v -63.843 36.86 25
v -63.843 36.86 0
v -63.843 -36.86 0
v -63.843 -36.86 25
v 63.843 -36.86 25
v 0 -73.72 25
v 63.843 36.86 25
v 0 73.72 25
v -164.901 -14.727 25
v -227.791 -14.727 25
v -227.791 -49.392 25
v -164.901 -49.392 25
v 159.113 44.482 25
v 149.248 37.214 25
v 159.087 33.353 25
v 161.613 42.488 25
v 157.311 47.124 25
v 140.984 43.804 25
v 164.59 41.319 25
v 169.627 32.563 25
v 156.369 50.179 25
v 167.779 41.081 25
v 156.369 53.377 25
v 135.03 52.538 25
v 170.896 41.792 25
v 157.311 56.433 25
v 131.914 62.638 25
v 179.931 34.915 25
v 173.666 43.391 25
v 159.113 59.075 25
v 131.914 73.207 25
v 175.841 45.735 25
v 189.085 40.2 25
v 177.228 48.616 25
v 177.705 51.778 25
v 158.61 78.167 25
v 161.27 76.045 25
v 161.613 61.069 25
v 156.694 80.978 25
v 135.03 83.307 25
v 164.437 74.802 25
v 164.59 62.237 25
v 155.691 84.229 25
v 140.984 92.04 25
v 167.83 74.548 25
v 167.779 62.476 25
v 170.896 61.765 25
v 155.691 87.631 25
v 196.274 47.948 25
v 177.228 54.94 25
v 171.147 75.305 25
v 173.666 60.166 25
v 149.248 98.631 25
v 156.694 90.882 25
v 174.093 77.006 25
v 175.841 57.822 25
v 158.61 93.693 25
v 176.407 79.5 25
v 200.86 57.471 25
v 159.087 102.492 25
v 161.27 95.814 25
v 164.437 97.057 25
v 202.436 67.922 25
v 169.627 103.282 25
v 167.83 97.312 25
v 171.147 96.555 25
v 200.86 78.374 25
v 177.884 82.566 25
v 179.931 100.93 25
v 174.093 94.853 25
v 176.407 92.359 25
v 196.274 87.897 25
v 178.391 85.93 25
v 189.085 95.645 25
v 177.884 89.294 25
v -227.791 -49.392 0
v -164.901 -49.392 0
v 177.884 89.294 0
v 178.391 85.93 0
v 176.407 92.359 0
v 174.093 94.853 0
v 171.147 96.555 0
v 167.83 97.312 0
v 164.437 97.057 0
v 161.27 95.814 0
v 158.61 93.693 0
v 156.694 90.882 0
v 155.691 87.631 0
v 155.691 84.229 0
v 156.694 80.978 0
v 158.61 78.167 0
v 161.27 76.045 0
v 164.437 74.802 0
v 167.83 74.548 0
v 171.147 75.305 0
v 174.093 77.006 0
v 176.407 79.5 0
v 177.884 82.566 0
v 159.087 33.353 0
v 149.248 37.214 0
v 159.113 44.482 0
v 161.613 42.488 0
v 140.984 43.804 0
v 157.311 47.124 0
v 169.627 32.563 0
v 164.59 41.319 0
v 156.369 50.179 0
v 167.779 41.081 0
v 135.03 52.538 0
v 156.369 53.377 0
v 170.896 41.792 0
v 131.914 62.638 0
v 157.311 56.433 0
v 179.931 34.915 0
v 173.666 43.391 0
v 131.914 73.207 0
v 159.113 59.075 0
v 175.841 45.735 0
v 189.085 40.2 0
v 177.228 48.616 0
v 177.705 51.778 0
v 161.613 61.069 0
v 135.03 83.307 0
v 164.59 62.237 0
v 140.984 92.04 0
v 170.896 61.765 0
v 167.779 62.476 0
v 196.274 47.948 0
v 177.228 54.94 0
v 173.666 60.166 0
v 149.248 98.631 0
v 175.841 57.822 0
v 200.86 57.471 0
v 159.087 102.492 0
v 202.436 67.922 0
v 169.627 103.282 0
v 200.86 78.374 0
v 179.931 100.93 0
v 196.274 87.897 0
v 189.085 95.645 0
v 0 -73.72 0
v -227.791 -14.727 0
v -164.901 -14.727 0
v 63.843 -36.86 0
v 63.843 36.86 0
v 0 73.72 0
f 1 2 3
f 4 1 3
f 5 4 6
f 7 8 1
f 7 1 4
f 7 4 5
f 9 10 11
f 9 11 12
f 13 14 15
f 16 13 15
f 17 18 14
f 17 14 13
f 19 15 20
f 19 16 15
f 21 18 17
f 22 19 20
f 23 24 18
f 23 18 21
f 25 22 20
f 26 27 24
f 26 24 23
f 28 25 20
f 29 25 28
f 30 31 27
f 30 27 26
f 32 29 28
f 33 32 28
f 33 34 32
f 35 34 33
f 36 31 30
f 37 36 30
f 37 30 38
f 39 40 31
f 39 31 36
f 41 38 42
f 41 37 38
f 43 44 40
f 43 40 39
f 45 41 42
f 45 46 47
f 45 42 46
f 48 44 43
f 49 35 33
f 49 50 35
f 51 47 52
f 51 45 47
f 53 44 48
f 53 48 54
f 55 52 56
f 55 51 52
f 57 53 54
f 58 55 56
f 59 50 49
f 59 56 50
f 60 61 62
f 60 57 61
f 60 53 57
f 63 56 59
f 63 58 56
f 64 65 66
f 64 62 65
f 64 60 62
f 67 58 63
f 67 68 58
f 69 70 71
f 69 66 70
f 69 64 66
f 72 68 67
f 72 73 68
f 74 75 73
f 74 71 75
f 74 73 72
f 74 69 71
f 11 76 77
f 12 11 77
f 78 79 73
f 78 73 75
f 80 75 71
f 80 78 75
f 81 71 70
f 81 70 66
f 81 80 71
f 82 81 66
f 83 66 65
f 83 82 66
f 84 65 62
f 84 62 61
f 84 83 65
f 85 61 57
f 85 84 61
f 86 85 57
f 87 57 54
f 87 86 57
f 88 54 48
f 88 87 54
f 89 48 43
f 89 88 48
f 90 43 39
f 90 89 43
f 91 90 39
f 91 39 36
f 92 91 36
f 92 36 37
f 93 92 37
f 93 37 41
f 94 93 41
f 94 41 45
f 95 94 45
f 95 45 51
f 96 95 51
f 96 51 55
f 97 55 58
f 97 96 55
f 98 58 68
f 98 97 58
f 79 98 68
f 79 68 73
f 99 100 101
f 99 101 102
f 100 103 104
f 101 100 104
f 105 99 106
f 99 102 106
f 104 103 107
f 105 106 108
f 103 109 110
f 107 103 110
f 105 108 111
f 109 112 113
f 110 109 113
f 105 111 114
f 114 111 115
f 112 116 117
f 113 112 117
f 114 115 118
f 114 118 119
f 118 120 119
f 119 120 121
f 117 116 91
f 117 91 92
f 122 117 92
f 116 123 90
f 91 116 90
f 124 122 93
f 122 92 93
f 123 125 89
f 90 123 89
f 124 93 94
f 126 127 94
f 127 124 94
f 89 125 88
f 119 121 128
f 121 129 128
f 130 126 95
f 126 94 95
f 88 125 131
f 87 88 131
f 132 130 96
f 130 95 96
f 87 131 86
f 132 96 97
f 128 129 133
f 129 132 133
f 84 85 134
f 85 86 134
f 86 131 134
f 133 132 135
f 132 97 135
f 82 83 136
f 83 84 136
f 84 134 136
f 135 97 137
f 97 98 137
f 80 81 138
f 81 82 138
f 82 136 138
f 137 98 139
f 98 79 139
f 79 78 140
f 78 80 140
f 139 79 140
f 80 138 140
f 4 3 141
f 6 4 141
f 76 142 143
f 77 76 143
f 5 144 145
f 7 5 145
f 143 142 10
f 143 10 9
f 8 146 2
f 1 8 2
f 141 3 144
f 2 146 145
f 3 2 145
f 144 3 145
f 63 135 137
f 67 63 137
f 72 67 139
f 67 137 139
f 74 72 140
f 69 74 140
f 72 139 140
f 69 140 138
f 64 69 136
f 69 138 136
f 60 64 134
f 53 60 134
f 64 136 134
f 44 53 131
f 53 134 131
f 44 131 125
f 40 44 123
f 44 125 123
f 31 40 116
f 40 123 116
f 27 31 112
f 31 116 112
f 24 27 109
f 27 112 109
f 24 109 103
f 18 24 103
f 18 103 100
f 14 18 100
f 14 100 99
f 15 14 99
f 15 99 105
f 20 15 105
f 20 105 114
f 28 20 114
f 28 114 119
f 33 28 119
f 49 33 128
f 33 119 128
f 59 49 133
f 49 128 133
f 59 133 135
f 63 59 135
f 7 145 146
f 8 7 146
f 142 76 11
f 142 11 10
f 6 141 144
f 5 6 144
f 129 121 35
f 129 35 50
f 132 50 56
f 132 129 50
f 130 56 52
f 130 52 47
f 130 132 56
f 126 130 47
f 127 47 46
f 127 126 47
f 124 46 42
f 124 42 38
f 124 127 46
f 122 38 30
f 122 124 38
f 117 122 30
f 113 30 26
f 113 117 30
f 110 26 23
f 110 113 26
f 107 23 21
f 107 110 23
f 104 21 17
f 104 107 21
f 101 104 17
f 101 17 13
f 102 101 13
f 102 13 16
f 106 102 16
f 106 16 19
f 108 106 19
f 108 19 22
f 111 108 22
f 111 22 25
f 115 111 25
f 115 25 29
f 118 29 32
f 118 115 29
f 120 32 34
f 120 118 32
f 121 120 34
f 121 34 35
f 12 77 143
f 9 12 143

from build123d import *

# Parameters (mm, degrees)
F1_DEPTH = 25
F2_R     = 35.458634
F2_R_2   = 10.727885
F2_R_3   = 11.413684
F3_DEPTH = 25
F4_W     = 62.889963
F4_H     = 34.664976
F5_DEPTH = 25


with BuildPart() as f1:
    # F0 (on Top) → F1 (new body)
    with BuildSketch(Plane.XY):
        Polygon((63.843265, -36.859926), (63.843265, 36.859926), (0, 73.719853), (-63.843265, 36.859926), (-63.843265, -36.859926), (0, -73.719853), align=None)
    extrude(amount=F1_DEPTH)


with BuildPart() as f3:
    # F2 (on Top) → F3 (new body)
    with BuildSketch(Plane.XY):
        with Locations((166.976973, 67.922495)):
            Circle(F2_R)
        with Locations((166.976973, 51.778398)):
            Circle(F2_R_2, mode=Mode.SUBTRACT)
        with Locations((166.976973, 85.929848)):
            Circle(F2_R_3, mode=Mode.SUBTRACT)
    extrude(amount=F3_DEPTH)


with BuildPart() as f5:
    # F4 (on Top) → F5 (new body)
    with BuildSketch(Plane.XY):
        with Locations((-196.346327, -32.059524)):
            Rectangle(F4_W, F4_H)
    extrude(amount=F5_DEPTH)


solid = Compound([f1.part, f3.part, f5.part])
